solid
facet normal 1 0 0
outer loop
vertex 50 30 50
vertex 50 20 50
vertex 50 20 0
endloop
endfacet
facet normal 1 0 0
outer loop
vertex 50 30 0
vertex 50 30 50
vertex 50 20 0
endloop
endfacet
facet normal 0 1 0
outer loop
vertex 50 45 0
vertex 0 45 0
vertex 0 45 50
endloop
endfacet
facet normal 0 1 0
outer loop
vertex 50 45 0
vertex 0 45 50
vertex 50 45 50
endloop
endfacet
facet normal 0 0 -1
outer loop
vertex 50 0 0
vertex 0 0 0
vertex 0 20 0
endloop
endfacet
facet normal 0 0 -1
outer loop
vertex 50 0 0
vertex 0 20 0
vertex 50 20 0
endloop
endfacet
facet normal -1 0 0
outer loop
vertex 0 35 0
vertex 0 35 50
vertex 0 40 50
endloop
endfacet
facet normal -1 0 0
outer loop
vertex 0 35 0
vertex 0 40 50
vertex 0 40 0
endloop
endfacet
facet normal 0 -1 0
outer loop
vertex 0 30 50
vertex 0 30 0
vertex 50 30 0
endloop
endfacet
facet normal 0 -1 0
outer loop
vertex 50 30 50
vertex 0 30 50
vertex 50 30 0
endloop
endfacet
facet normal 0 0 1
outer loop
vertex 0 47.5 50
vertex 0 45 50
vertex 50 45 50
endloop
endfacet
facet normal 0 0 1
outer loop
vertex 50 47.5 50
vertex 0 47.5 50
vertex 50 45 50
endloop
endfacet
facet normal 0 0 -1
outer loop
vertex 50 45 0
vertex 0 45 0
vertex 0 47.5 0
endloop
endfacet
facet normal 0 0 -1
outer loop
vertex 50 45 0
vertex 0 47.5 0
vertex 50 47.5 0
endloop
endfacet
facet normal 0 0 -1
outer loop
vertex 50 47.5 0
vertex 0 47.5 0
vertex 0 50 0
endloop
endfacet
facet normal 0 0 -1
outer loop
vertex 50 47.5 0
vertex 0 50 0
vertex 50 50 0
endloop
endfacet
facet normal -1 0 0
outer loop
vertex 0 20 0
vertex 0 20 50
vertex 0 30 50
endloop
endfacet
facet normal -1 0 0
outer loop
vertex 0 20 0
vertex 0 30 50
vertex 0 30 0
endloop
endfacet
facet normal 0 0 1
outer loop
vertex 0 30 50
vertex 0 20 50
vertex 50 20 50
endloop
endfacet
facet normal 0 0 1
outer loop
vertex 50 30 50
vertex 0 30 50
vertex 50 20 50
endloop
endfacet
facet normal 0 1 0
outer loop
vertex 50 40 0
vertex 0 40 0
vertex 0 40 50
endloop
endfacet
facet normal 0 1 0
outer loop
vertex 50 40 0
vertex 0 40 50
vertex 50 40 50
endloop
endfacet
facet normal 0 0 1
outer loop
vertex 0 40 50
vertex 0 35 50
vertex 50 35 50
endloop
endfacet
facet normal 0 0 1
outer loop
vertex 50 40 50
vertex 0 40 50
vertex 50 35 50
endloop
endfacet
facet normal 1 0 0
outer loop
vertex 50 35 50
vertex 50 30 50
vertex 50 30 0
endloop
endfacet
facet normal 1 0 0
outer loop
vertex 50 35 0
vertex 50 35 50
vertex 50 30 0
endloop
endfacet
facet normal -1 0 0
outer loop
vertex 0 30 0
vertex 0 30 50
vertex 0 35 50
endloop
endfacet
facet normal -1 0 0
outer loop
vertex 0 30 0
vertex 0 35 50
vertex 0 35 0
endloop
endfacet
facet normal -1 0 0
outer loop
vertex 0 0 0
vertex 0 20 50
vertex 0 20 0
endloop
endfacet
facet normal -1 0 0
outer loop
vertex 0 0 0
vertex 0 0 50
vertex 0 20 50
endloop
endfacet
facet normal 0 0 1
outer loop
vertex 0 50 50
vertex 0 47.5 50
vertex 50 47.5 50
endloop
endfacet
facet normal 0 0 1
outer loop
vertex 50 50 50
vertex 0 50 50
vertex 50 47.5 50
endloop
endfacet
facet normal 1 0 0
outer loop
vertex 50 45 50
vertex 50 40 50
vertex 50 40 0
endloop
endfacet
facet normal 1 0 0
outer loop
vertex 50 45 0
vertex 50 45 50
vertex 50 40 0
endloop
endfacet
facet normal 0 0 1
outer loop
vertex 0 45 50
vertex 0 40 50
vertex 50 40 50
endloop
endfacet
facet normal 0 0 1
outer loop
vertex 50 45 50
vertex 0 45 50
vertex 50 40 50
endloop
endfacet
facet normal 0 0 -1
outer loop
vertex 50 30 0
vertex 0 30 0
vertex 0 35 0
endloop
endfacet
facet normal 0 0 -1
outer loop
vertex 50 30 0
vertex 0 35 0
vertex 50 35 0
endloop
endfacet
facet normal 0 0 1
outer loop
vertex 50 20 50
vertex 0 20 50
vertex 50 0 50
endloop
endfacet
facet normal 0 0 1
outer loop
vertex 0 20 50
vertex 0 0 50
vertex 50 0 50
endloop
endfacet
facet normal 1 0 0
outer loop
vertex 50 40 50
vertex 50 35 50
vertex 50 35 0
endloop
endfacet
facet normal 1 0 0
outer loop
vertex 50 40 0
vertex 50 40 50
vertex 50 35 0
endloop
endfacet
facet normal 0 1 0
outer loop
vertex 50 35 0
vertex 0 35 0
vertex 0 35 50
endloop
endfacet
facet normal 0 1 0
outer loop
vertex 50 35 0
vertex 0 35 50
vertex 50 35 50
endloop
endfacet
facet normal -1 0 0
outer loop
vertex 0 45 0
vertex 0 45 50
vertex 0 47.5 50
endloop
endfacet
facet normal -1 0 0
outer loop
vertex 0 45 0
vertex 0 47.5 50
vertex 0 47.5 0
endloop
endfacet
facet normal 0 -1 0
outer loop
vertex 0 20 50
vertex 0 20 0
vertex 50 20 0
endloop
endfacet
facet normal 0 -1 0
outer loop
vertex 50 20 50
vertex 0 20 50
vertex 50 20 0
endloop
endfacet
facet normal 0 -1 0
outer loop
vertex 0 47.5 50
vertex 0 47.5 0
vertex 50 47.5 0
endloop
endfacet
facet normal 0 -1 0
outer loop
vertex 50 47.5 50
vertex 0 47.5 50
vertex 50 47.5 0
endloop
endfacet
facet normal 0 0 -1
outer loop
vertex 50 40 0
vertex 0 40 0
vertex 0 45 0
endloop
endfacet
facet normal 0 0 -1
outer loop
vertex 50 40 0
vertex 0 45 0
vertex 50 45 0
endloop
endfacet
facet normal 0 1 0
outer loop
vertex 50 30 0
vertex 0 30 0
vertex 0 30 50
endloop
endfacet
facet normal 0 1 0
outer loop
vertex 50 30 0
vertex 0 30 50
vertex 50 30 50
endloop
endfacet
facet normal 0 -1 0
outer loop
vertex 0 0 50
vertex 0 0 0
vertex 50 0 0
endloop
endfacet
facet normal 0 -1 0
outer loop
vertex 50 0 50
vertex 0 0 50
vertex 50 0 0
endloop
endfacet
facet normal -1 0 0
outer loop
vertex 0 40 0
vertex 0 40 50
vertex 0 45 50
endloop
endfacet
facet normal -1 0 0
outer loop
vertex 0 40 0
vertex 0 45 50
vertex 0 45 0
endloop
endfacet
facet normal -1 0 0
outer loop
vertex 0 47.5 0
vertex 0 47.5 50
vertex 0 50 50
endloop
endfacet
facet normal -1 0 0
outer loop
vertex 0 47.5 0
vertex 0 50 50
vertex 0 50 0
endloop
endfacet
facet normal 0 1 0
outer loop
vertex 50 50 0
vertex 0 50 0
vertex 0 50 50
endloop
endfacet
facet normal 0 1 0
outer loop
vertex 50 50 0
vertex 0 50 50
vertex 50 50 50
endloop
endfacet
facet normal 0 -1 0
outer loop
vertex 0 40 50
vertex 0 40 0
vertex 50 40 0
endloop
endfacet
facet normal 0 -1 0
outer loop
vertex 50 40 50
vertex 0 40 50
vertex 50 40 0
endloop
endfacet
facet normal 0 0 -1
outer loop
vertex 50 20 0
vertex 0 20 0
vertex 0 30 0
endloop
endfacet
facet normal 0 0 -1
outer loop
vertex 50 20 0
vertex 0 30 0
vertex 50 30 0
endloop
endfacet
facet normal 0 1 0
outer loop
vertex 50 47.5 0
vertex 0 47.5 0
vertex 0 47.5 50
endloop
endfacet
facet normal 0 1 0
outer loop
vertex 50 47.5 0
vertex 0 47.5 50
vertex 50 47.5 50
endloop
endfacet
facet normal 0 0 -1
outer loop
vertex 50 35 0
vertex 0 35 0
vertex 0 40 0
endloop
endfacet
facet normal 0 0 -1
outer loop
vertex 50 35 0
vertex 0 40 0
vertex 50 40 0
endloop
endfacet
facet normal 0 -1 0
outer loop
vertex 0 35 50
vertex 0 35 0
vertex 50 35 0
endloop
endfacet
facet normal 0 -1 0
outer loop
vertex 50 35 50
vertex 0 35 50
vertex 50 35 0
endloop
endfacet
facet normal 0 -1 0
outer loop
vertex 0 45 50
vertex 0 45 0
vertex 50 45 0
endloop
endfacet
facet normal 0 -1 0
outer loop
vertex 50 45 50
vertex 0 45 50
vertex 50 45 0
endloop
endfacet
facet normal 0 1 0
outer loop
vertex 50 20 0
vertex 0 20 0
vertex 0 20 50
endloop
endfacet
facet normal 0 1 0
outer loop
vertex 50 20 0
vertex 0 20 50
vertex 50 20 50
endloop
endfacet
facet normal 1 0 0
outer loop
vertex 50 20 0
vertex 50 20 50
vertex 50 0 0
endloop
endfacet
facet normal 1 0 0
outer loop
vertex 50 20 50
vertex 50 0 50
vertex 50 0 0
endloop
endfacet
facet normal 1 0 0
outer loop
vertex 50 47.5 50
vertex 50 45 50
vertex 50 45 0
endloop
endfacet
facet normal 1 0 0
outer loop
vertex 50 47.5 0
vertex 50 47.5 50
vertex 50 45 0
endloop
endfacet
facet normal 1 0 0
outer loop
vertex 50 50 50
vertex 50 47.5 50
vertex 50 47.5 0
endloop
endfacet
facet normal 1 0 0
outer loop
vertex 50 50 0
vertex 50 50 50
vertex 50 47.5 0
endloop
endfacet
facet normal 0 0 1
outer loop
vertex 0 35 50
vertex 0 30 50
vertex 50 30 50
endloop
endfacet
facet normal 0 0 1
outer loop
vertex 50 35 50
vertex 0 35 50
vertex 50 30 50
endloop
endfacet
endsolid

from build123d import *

# Parameters (mm, degrees)
SKETCH_1_W             = 50
SKETCH_1_H             = 50
EXTRUDE_1_DEPTH        = 5
PATTERN_LINEAR_1_COUNT = 9
PATTERN_LINEAR_1_PITCH = 5
SKETCH_2_W             = 50
SKETCH_2_H             = 50
EXTRUDE_2_DEPTH        = 2.5
SKETCH_3_W             = 50
SKETCH_3_H             = 50
EXTRUDE_3_DEPTH        = 2.5


with BuildPart() as part:
    # 草图1 → 凸台-拉伸1 (new body)
    with BuildSketch(Plane(origin=(0, 0, 0), x_dir=(1, 0, 0), z_dir=(0, 1, 0))):
        with Locations((25, -25)):
            Rectangle(SKETCH_1_W, SKETCH_1_H)
    extrude(amount=EXTRUDE_1_DEPTH)


with BuildPart() as pattern_linear_1_1:
    # 阵列(线性)1: pattern copy
    add(part.part.moved(Location(Vector(0, 1, 0) * (1 * PATTERN_LINEAR_1_PITCH))))


with BuildPart() as pattern_linear_1_2:
    # 阵列(线性)1: pattern copy
    add(part.part.moved(Location(Vector(0, 1, 0) * (2 * PATTERN_LINEAR_1_PITCH))))


with BuildPart() as pattern_linear_1_3:
    # 阵列(线性)1: pattern copy
    add(part.part.moved(Location(Vector(0, 1, 0) * (3 * PATTERN_LINEAR_1_PITCH))))


with BuildPart() as pattern_linear_1_4:
    # 阵列(线性)1: pattern copy
    add(part.part.moved(Location(Vector(0, 1, 0) * (4 * PATTERN_LINEAR_1_PITCH))))


with BuildPart() as pattern_linear_1_5:
    # 阵列(线性)1: pattern copy
    add(part.part.moved(Location(Vector(0, 1, 0) * (5 * PATTERN_LINEAR_1_PITCH))))

    # Combine 2: read off the stored shape, not the designer's step
    # Combine 2: union 阵列(线性)1_4
    add(pattern_linear_1_4.part)


with BuildPart() as pattern_linear_1_6:
    # 阵列(线性)1: pattern copy
    add(part.part.moved(Location(Vector(0, 1, 0) * (6 * PATTERN_LINEAR_1_PITCH))))


with BuildPart() as pattern_linear_1_7:
    # 阵列(线性)1: pattern copy
    add(part.part.moved(Location(Vector(0, 1, 0) * (7 * PATTERN_LINEAR_1_PITCH))))


with BuildPart() as pattern_linear_1_8:
    # 阵列(线性)1: pattern copy
    add(part.part.moved(Location(Vector(0, 1, 0) * (8 * PATTERN_LINEAR_1_PITCH))))


with BuildPart() as pattern_linear_1_2_1:
    add(pattern_linear_1_2.part)

    # Combine 1: read off the stored shape, not the designer's step
    # Combine 1: union part, 阵列(线性)1_3, 阵列(线性)1_1
    add(part.part)
    add(pattern_linear_1_3.part)
    add(pattern_linear_1_1.part)


with BuildPart() as body_6:
    # 草图2 → 凸台-拉伸2 (new body)
    with BuildSketch(Plane(origin=(0, 45, 0), x_dir=(1, 0, 0), z_dir=(0, 1, 0))):
        with Locations((25, -25)):
            Rectangle(SKETCH_2_W, SKETCH_2_H)
    extrude(amount=EXTRUDE_2_DEPTH)


with BuildPart() as body_7:
    # 草图3 → 凸台-拉伸3 (new body)
    with BuildSketch(Plane(origin=(0, 47.5, 0), x_dir=(1, 0, 0), z_dir=(0, 1, 0))):
        with Locations((25, -25)):
            Rectangle(SKETCH_3_W, SKETCH_3_H)
    extrude(amount=EXTRUDE_3_DEPTH)


solid = Compound([pattern_linear_1_5.part, pattern_linear_1_6.part, pattern_linear_1_7.part, pattern_linear_1_8.part, pattern_linear_1_2_1.part, body_6.part, body_7.part])
